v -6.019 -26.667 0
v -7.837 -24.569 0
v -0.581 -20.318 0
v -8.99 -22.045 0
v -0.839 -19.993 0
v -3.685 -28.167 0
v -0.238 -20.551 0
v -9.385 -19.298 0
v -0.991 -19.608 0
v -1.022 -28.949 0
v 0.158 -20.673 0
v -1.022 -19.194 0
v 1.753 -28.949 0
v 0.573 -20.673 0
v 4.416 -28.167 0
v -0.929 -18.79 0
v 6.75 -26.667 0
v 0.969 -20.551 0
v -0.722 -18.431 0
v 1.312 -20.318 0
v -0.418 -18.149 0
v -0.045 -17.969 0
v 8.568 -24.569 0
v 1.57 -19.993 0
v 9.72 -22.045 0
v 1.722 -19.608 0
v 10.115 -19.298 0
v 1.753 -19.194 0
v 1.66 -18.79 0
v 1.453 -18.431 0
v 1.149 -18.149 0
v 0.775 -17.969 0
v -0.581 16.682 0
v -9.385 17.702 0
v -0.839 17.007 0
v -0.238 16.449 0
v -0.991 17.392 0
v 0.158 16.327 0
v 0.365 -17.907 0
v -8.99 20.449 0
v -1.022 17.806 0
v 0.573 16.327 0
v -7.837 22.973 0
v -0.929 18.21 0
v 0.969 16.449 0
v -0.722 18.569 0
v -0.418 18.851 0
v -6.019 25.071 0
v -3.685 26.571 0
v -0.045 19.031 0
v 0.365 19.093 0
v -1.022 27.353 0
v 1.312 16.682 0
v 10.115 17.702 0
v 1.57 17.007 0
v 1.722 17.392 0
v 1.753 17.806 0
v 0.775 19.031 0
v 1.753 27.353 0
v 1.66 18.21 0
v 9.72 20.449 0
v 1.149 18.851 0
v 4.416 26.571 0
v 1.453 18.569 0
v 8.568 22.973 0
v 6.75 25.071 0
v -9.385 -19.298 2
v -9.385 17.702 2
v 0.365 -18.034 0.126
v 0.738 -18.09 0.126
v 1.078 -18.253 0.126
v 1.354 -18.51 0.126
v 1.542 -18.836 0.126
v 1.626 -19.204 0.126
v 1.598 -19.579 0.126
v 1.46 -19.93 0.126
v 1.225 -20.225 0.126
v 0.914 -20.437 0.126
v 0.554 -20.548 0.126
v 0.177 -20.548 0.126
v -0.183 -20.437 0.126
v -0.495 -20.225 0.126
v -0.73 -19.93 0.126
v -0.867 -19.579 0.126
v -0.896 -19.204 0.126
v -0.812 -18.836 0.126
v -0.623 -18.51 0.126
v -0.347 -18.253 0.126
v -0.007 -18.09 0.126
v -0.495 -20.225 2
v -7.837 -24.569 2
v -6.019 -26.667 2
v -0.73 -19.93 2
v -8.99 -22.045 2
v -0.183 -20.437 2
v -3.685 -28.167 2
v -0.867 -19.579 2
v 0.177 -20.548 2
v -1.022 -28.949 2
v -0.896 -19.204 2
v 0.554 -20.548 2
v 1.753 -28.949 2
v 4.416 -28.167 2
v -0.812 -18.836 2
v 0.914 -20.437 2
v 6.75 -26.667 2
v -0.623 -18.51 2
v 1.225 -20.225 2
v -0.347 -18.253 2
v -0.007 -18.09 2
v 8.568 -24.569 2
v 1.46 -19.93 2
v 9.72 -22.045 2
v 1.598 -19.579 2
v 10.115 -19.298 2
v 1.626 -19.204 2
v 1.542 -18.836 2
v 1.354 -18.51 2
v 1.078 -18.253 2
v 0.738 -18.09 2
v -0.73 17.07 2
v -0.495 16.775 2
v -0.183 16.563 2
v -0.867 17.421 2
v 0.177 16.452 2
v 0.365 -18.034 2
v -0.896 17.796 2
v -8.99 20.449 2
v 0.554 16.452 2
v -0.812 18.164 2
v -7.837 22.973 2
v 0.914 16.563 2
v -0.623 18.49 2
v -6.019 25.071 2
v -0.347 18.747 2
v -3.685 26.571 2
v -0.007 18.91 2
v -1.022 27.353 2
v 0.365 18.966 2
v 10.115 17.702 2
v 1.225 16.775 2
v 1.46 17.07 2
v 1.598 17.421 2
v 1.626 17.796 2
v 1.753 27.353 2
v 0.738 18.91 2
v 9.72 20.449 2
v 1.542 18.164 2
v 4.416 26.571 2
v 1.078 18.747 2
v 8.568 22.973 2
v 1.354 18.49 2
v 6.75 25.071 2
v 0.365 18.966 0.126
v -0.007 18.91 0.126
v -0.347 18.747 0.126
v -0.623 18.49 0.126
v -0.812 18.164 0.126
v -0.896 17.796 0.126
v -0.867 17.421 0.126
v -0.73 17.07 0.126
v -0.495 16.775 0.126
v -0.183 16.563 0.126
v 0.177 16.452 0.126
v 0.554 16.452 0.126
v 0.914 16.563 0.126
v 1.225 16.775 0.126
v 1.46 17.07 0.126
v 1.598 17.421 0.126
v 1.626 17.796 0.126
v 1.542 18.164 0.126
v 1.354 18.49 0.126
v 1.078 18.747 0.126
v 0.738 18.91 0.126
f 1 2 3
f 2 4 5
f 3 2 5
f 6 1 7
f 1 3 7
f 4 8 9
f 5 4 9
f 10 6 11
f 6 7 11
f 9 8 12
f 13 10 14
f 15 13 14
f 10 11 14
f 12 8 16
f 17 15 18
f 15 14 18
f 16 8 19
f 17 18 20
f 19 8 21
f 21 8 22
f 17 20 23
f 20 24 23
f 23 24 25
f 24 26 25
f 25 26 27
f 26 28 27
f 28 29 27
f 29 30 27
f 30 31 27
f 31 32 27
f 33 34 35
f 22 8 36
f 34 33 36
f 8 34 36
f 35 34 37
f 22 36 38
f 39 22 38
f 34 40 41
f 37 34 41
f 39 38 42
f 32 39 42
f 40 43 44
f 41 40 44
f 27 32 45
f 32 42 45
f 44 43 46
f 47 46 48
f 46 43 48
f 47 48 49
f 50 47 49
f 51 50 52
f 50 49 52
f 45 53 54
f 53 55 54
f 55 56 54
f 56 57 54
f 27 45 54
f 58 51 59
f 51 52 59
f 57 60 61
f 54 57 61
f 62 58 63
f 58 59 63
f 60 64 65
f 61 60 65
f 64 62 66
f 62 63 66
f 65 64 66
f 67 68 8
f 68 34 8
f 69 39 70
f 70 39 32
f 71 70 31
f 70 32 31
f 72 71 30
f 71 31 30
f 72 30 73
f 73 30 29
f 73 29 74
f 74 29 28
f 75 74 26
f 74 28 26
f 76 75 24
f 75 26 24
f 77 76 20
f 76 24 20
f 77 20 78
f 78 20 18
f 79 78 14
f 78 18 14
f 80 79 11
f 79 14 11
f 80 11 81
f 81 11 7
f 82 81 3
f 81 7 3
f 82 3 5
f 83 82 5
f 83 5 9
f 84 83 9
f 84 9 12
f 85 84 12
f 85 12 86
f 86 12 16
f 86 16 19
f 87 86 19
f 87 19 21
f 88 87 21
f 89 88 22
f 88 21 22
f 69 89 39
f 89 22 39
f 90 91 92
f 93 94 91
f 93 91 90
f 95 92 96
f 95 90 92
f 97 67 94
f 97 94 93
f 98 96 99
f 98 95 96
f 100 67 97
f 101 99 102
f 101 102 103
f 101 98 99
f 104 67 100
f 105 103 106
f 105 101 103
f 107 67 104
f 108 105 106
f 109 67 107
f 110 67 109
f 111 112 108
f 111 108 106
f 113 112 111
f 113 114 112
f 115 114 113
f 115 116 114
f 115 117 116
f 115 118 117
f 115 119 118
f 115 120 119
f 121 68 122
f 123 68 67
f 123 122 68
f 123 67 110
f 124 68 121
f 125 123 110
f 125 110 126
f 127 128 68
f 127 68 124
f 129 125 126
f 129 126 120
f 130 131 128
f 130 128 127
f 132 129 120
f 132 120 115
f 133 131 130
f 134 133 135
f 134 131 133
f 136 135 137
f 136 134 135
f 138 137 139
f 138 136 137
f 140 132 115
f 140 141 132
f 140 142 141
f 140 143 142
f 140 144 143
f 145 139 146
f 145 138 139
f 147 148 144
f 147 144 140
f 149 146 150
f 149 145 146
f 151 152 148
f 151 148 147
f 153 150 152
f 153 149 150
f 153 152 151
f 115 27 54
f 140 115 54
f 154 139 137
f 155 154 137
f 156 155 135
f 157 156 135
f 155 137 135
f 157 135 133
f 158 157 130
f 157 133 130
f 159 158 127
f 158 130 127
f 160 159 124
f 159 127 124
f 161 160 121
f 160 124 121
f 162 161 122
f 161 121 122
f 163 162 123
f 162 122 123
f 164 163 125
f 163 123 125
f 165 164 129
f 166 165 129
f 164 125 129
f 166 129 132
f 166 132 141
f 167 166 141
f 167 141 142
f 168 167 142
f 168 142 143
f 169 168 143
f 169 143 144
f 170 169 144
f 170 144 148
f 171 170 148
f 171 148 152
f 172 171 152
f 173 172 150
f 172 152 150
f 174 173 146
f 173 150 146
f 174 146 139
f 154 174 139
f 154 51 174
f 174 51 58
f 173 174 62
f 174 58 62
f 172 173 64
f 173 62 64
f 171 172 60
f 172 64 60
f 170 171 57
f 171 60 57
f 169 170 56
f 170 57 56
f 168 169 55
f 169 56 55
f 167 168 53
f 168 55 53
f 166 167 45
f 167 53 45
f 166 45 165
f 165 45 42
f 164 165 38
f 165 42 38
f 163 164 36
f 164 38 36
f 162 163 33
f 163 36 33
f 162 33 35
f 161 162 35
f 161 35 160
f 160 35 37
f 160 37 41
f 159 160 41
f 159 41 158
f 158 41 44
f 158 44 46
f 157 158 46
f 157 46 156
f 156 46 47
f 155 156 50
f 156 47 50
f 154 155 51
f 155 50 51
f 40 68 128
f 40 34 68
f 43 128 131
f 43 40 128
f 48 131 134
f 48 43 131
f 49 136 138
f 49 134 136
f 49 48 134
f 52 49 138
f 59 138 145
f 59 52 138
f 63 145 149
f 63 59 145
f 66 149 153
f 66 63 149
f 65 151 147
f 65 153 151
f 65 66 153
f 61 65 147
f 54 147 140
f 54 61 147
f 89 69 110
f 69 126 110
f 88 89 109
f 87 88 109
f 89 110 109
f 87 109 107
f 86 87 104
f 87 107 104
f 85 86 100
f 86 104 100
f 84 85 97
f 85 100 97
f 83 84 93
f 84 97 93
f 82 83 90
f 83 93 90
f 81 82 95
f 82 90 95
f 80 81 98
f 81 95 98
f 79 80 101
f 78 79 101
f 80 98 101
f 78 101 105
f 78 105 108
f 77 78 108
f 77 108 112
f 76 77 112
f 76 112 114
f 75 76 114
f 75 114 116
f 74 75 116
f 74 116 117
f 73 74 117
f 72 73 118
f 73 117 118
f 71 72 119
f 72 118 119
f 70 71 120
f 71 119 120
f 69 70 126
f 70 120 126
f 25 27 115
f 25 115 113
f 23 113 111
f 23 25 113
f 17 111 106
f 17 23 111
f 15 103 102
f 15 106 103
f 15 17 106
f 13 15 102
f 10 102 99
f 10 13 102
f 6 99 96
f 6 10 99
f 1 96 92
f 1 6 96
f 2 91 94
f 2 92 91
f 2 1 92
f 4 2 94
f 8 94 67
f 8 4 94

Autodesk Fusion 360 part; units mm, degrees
sketch "Sketch1" plane through (0, 0, 0) normal (0, 0, 1) x (1, 0, 0)
  line L0 (-9.3846, 17.702) -> (-9.3846, -19.298)
  arc A0 (-9.3846, -19.298) -> (10.1154, -19.298) centre (0.3654, -19.298) ccw
  line L1 (10.1154, -19.298) -> (10.1154, 17.702)
  arc A1 (10.1154, 17.702) -> (-9.3846, 17.702) centre (0.3654, 17.702) ccw
  line L2 (0.3654, 17.702) -> (0.3654, -19.298) construction
  dimension "d1" = 37
  dimension "d2" = 9.75
extrude "Extrude1" add sketch "Sketch1" along normal blind 2
hole "Hole1" at (0.3654, 17.702, 0) at (0.3654, -19.298, 0) direction (0, 0, 1) diameter 2.529 depth 2 tip angle 180 countersink diameter 2.782 countersink angle 90
